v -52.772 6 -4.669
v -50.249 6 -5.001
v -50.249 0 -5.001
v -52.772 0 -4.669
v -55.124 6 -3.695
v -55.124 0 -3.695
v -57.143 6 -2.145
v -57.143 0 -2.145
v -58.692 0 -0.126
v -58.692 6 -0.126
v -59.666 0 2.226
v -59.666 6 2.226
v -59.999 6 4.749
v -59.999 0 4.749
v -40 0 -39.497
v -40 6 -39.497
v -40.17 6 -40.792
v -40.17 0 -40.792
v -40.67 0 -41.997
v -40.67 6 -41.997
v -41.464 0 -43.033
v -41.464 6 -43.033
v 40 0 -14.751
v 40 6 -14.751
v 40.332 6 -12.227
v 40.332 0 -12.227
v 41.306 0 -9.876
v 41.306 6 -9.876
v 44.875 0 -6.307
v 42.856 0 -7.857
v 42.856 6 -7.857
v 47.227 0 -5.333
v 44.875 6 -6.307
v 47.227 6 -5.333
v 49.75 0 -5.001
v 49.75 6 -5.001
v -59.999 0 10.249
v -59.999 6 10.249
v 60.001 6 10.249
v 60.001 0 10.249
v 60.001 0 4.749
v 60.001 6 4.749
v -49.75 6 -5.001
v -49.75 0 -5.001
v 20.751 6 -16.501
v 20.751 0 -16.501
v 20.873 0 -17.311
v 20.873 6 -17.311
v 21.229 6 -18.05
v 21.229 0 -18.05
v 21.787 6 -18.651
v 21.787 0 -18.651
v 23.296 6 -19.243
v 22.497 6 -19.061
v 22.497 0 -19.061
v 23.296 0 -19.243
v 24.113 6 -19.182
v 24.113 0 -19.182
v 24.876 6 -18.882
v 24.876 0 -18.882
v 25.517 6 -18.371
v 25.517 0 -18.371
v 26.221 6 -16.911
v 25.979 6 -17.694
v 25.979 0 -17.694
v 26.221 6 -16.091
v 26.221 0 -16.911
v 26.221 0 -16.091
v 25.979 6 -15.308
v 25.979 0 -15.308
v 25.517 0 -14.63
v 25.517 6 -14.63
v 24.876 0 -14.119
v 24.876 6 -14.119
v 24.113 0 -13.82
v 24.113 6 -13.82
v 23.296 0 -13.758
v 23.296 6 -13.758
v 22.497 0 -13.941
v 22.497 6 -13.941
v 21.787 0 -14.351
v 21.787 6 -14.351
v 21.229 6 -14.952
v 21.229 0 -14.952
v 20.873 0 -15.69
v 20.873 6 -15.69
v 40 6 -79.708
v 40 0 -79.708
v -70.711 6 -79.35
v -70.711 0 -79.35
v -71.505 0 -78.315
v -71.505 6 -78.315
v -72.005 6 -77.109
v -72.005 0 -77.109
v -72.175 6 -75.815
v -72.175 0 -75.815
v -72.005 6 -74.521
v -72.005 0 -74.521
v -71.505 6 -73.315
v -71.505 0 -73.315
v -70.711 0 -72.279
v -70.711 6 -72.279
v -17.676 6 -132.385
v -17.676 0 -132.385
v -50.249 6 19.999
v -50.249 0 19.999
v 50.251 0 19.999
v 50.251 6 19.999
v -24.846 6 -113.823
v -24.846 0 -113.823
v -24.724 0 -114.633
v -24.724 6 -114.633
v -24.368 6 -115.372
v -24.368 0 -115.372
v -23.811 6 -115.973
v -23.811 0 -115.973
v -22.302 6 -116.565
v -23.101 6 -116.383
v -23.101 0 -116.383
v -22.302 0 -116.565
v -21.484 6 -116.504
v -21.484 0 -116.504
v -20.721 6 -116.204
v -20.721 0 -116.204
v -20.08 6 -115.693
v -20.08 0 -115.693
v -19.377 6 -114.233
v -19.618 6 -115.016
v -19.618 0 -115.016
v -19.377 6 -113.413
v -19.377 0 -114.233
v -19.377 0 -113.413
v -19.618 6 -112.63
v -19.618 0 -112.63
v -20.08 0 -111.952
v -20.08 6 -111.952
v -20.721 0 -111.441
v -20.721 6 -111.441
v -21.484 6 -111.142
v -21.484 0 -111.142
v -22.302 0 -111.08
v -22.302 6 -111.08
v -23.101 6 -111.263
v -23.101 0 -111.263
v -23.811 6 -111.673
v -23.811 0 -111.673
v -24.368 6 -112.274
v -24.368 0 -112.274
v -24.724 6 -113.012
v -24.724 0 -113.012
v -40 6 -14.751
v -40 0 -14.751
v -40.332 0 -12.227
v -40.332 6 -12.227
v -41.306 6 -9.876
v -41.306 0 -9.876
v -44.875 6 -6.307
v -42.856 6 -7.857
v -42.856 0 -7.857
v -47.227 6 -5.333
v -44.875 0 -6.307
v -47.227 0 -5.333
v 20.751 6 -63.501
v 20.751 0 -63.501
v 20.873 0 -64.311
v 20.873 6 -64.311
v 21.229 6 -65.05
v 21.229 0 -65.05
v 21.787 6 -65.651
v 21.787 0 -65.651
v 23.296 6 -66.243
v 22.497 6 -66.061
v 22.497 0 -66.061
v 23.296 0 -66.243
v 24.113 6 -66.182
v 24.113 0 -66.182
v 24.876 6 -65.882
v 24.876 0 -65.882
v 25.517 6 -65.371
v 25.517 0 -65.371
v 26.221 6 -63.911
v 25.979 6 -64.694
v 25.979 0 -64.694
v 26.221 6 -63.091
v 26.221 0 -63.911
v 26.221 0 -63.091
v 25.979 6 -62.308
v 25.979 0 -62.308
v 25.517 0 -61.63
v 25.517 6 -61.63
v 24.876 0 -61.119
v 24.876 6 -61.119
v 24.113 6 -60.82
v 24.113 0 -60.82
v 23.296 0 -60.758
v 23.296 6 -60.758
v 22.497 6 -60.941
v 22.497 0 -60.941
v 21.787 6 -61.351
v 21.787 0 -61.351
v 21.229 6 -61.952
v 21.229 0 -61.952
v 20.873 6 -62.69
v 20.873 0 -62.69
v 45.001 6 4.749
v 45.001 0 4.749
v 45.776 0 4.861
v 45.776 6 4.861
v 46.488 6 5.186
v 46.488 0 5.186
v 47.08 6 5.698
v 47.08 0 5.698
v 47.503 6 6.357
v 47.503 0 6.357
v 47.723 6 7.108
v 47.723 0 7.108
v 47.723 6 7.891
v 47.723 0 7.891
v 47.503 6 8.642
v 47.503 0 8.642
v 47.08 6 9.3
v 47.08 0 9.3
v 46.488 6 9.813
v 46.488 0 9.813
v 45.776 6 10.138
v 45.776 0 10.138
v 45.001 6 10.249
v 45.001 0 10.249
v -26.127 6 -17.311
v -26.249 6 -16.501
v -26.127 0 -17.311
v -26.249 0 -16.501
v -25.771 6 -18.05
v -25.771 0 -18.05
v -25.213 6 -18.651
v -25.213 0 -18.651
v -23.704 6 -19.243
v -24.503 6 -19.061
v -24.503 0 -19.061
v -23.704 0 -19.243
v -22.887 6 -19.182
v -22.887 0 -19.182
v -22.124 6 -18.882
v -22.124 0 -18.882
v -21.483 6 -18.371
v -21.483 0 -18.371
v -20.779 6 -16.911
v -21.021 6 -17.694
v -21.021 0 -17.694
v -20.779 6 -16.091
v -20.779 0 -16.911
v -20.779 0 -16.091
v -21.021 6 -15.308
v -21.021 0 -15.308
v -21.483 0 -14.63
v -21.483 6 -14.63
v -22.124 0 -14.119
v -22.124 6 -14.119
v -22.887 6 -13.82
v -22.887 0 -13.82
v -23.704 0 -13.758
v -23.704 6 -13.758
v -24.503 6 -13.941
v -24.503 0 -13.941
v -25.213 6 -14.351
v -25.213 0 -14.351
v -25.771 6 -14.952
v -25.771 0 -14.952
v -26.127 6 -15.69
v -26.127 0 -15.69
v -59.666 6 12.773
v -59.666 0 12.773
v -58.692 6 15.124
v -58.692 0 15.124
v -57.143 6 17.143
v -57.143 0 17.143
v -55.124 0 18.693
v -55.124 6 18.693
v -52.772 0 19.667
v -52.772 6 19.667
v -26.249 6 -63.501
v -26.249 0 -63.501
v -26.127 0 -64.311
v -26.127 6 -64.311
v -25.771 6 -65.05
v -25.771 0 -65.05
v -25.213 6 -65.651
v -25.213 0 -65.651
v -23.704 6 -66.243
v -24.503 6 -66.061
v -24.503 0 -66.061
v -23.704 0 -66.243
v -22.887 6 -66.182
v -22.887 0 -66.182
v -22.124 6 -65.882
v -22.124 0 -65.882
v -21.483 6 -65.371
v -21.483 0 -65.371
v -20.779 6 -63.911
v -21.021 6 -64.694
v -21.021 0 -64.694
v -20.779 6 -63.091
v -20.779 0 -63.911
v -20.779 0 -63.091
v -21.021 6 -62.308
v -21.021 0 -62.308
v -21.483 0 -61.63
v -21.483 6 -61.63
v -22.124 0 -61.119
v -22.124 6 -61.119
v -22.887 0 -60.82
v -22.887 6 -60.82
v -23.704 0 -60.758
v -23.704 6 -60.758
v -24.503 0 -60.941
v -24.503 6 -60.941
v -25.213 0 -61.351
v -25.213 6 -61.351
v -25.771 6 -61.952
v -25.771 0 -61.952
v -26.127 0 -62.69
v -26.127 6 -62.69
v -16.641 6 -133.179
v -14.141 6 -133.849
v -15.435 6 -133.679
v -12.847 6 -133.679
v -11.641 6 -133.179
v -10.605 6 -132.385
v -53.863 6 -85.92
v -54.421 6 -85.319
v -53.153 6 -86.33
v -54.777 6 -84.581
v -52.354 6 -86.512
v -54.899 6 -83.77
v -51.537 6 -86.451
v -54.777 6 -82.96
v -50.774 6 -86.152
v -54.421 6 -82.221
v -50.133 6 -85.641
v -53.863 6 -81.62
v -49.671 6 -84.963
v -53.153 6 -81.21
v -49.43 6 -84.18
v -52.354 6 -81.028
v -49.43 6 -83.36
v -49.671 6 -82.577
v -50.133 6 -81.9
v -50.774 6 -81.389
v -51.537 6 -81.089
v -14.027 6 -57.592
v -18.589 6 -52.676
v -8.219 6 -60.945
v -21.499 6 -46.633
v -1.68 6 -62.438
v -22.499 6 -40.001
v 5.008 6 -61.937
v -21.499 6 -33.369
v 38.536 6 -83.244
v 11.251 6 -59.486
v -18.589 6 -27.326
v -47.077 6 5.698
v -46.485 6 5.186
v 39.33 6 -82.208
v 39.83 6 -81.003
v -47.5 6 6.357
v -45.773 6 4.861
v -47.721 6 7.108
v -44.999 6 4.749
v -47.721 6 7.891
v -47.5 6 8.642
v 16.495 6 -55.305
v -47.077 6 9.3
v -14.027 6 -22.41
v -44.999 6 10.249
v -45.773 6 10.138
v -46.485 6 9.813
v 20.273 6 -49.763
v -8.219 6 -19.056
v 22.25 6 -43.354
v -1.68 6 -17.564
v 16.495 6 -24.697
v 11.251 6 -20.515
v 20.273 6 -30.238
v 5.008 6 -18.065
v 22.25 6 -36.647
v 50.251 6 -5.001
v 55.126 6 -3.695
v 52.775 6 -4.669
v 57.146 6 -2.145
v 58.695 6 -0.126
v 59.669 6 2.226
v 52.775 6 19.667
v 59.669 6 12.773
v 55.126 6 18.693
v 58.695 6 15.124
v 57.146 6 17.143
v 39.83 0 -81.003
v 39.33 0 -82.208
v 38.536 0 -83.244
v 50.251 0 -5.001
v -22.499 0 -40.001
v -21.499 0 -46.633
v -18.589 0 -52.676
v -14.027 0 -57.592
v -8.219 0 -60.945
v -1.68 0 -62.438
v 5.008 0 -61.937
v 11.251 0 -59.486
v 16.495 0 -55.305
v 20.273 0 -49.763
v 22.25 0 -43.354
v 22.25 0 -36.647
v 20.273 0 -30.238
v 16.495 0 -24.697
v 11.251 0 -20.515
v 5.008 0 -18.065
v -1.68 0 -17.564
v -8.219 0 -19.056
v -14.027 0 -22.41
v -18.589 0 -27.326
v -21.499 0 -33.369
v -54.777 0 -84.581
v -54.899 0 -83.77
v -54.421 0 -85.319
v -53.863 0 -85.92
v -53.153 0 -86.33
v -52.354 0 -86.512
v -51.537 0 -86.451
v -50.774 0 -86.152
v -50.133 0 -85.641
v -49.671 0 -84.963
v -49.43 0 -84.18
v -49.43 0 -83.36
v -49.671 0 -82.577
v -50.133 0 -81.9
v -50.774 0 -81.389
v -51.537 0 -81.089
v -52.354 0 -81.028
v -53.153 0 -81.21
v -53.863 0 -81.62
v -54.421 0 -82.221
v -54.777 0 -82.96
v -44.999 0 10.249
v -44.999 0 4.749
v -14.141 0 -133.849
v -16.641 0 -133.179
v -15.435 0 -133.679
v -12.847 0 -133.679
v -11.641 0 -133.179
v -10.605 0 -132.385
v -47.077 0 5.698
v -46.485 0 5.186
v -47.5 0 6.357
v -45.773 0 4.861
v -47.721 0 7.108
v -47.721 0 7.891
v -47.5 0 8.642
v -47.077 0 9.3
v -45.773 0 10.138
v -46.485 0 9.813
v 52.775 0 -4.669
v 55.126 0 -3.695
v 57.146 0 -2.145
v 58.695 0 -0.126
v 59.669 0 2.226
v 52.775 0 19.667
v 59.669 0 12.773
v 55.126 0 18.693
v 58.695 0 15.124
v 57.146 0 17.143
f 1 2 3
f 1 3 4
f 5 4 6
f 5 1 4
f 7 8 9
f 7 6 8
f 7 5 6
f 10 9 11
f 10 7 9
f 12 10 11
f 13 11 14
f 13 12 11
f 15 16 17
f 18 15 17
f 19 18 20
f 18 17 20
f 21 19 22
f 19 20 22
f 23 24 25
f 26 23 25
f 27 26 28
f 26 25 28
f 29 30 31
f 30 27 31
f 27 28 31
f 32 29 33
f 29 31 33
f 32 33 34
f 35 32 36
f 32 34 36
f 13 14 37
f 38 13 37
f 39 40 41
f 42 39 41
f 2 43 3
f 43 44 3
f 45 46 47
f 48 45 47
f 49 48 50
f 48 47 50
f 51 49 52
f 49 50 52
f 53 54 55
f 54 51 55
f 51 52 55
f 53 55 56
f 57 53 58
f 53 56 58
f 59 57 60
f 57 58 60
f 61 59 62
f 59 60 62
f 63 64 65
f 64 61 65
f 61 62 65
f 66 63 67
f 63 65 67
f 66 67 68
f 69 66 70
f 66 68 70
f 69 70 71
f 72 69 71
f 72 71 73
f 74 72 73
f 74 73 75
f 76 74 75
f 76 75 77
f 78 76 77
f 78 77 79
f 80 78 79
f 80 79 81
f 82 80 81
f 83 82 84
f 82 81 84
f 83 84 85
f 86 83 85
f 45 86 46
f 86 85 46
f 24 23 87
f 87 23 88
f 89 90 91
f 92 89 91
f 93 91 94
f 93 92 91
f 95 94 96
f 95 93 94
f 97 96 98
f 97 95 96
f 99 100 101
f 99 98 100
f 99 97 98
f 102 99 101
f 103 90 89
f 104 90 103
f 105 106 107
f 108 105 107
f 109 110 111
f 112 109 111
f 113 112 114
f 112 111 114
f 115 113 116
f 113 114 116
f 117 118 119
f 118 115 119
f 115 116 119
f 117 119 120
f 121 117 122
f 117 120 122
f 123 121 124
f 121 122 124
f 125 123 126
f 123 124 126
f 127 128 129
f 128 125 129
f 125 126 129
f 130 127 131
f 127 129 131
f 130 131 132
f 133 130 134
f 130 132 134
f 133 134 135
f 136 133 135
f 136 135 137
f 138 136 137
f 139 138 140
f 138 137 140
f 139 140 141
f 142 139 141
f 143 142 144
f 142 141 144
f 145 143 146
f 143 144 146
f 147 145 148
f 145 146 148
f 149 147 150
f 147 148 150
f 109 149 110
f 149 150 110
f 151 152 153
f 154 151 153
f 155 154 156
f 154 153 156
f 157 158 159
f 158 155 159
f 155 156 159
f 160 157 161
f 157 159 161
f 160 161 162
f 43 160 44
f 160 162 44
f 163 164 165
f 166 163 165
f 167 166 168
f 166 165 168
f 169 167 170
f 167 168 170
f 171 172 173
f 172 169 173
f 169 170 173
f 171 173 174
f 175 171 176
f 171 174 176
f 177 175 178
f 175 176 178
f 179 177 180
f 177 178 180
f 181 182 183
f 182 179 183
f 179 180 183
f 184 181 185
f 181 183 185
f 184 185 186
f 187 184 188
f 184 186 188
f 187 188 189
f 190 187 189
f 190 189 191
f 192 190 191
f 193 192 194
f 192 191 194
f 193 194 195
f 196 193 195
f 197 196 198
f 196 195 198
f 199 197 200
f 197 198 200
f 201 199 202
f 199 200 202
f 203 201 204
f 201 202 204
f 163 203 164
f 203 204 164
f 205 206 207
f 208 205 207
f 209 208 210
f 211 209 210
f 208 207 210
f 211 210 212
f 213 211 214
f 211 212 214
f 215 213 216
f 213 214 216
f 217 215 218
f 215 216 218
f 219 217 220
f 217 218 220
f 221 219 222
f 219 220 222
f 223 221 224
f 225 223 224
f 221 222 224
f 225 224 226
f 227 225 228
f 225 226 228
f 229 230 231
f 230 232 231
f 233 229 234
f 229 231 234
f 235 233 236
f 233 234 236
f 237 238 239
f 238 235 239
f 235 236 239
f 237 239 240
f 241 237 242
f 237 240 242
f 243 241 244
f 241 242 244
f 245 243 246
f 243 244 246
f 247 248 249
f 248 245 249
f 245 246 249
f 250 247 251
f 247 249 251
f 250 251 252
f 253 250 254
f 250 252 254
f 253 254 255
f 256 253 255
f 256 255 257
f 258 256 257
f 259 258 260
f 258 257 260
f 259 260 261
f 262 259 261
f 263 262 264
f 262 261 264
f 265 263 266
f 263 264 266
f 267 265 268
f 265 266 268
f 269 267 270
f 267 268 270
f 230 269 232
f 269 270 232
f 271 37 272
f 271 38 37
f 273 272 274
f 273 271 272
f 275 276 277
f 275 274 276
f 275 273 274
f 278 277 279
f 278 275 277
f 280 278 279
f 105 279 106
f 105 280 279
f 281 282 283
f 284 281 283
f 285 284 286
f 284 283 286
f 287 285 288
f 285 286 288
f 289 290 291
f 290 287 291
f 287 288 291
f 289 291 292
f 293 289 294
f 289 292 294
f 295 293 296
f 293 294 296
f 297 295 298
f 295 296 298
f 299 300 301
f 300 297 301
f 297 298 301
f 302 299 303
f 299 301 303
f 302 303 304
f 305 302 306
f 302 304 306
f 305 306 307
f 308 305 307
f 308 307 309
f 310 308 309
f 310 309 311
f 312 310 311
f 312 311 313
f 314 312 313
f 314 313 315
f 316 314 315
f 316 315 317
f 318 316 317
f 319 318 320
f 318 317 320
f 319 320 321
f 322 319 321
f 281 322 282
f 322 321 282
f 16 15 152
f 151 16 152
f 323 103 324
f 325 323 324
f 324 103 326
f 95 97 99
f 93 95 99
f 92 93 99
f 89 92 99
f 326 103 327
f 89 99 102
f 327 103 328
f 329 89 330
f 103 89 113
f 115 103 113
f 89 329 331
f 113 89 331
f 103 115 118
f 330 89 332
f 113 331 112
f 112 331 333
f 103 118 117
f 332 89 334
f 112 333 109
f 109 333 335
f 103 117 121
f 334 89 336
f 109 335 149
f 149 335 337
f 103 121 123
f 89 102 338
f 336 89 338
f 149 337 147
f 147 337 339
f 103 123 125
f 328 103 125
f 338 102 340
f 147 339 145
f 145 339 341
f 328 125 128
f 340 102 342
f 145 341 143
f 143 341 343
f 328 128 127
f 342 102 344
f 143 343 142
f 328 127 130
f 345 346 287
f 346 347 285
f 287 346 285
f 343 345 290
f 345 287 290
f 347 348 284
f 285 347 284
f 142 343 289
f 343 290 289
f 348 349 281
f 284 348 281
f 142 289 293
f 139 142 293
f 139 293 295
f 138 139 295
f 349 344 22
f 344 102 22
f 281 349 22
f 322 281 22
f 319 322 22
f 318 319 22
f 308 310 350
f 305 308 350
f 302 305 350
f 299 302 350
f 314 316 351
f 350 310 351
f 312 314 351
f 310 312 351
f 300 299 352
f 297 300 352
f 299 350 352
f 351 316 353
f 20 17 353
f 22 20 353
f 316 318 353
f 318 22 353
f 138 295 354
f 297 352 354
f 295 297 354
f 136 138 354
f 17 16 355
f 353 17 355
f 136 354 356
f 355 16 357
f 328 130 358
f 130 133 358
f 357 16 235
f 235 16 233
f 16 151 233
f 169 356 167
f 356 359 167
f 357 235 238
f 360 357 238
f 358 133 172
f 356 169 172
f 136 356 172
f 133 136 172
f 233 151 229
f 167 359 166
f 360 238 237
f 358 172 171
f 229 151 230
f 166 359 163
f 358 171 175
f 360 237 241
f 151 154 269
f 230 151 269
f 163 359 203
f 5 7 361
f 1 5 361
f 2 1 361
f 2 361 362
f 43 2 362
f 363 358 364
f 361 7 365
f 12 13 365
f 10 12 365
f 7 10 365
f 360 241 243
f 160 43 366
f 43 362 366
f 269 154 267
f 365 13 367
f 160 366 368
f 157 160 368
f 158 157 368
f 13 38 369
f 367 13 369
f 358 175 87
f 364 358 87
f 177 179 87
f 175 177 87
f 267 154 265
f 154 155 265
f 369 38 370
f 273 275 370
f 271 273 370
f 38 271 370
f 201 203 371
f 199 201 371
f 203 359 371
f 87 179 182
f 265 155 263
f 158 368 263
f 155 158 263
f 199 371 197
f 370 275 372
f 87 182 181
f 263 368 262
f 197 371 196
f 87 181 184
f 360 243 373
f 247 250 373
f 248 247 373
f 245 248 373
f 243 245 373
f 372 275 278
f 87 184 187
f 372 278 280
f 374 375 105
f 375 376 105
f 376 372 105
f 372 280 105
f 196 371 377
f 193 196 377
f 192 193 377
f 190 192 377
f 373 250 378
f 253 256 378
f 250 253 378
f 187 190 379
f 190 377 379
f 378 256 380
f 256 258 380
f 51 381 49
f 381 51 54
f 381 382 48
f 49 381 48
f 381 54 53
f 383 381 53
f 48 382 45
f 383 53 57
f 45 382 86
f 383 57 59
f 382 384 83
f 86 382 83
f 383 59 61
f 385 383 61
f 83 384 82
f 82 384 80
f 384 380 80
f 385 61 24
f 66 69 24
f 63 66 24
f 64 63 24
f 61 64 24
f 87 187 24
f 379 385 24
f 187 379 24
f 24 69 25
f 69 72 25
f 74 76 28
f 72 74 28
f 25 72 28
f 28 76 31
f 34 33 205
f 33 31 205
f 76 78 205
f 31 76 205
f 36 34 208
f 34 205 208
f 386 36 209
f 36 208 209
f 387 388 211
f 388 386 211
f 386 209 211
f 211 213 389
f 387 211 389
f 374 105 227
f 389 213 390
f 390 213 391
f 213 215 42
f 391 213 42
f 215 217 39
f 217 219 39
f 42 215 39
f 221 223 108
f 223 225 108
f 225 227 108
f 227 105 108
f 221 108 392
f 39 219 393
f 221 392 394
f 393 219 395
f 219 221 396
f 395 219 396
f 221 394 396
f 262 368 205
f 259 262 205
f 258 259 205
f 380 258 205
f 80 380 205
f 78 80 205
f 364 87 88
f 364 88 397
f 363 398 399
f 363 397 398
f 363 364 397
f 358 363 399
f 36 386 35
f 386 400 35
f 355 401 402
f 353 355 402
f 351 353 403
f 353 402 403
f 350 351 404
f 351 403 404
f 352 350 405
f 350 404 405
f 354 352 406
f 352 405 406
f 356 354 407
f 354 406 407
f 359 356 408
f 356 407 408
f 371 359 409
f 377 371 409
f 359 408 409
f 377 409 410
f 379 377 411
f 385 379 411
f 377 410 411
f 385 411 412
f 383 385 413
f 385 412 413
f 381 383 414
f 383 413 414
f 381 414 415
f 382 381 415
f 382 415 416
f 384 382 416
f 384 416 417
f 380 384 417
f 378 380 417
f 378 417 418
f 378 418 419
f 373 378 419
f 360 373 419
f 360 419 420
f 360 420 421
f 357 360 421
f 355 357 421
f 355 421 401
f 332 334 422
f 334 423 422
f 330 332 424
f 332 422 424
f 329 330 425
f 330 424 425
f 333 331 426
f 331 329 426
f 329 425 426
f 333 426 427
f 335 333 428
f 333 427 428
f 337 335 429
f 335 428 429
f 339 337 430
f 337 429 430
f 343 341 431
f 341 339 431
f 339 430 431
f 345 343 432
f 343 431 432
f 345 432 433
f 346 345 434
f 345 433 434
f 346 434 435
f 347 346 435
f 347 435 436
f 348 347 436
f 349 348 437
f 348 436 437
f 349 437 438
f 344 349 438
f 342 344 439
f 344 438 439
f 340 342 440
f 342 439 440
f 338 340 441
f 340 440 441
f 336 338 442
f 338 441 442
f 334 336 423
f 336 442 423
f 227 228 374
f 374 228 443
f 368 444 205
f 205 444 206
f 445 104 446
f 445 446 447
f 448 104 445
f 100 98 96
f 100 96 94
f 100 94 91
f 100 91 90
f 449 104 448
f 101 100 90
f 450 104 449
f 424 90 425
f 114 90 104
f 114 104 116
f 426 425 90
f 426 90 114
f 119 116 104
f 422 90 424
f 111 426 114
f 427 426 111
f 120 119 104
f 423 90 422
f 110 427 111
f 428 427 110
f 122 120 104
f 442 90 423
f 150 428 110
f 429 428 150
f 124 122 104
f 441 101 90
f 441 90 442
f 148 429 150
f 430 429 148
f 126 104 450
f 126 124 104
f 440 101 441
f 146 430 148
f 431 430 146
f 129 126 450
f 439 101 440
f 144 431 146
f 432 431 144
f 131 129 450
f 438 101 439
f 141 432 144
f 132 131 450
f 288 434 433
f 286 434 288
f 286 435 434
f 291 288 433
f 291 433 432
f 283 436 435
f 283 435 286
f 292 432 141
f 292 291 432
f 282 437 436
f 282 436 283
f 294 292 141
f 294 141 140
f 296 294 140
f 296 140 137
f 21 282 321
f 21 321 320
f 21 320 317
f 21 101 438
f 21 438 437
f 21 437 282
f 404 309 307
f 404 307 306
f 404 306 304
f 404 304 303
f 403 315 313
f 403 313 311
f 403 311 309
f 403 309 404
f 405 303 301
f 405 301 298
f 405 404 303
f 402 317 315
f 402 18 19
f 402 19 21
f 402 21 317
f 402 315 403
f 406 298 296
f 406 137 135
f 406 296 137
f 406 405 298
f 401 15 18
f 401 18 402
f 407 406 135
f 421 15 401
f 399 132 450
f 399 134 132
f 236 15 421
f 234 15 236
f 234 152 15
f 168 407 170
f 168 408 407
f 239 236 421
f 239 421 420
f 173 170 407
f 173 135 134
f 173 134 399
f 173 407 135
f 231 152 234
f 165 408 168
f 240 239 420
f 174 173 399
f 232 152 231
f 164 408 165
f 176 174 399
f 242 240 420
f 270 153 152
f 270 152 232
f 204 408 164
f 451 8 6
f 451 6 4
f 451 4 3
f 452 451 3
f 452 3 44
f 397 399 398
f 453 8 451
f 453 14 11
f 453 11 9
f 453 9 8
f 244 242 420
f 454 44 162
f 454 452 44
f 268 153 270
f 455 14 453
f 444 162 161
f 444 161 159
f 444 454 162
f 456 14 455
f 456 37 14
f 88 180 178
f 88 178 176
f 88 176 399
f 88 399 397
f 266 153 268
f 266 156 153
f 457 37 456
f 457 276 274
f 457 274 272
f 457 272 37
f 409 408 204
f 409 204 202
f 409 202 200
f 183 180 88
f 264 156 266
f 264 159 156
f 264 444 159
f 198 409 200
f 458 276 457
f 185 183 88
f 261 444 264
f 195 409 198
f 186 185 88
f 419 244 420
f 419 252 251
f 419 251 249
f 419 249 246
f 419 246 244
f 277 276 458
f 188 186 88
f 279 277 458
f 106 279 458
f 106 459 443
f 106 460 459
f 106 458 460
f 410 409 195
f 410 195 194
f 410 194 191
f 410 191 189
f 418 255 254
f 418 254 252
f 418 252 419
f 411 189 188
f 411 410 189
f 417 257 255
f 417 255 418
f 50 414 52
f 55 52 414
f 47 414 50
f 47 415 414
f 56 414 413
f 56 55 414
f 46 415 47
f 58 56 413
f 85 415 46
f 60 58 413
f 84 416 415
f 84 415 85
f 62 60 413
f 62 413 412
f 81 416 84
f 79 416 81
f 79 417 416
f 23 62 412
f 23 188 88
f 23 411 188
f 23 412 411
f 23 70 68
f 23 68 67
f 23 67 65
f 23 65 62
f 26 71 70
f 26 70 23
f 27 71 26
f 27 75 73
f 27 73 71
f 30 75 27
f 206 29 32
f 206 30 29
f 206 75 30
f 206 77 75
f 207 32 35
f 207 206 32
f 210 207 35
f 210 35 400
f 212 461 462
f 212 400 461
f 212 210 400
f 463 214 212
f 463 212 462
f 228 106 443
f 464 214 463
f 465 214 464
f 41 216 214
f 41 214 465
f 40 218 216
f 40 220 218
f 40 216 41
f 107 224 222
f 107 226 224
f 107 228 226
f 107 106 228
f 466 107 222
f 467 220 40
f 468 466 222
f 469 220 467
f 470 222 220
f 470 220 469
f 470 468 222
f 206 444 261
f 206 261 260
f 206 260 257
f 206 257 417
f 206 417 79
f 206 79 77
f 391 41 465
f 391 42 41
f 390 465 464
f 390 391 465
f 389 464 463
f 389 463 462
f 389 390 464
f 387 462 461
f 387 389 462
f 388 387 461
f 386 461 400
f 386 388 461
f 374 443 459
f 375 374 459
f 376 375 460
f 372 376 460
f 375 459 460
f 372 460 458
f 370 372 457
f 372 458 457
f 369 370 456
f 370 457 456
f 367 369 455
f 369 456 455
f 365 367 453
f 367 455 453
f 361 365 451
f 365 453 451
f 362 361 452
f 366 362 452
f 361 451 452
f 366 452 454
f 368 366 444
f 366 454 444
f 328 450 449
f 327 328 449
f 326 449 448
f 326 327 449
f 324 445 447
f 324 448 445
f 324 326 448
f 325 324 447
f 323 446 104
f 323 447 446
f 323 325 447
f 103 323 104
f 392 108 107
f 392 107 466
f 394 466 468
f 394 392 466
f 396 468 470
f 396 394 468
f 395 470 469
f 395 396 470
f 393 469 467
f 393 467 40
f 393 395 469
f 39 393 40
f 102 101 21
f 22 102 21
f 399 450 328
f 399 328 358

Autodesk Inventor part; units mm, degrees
ref_plane "YZ Plane" through (0, 0, 0) normal (1, 0, 0) x (0, 1, 0)
sketch "Sketch1" plane through (0, 0, 0) normal (0, 1, 0) x (-1, 0, 0)
  line L0 (40, 90) -> (-40, 90)
  line L1 (-40, 90) -> (-40, -81.7795)
  line L2 (40, -41.5685) -> (40, 90)
  line L3 (40, 90) -> (-40, -90) construction
  line L4 (-40, 90) -> (40, -90) construction
  circle A0 centre (-0.0013, 54.9992) radius 5.1
  line L5 (23.4987, -16.5008) -> (-23.5013, -16.5008) construction
  line L6 (-23.5013, -16.5008) -> (-23.5013, -63.5008) construction
  line L7 (-23.5013, -63.5008) -> (23.4987, -63.5008) construction
  line L8 (23.4987, -63.5008) -> (23.4987, -16.5008) construction
  line L9 (23.4987, -16.5008) -> (-23.5013, -63.5008) construction
  line L10 (-23.5013, -16.5008) -> (23.4987, -63.5008) construction
  circle A1 centre (23.4987, -16.5008) radius 2.75
  circle A2 centre (23.4987, -63.5008) radius 2.75
  circle A3 centre (-23.5013, -16.5008) radius 2.75
  circle A4 centre (-23.5013, -63.5008) radius 2.75
  line L11 (-0.0013, -90.0008) -> (-0.0013, -80) construction
  line L12 (19.9987, -11.0008) -> (-20.0013, -11.0008) construction
  line L13 (-20.0013, -11.0008) -> (-20.0013, -69.0008) construction
  line L14 (-20.0013, -69.0008) -> (19.9987, -69.0008) construction
  line L15 (19.9987, -69.0008) -> (19.9987, -11.0008) construction
  line L16 (19.9987, -11.0008) -> (-20.0013, -69.0008) construction
  line L17 (-20.0013, -11.0008) -> (19.9987, -69.0008) construction
  line L18 (-29.0013, -60.0008) -> (28.9987, -60.0008) construction
  line L19 (28.9987, -60.0008) -> (28.9987, -20.0008) construction
  line L20 (28.9987, -20.0008) -> (-29.0013, -20.0008) construction
  line L21 (-29.0013, -20.0008) -> (-29.0013, -60.0008)
  line L22 (-29.0013, -60.0008) -> (28.9987, -20.0008) construction
  line L23 (28.9987, -60.0008) -> (-29.0013, -20.0008) construction
  line L24 (-0.0013, 54.9992) -> (102.5291, -47.5313) construction
  line L25 (-0.0013, 54.9992) -> (144.9987, 54.9992) construction
  line L26 (28.2843, 83.2843) -> (-28.2843, 26.7157) construction
  line L27 (-28.2843, 26.7157) -> (74.2462, -75.8148) construction
  line L28 (74.2462, -75.8148) -> (130.8148, -19.2462) construction
  line L29 (130.8148, -19.2462) -> (28.2843, 83.2843) construction
  line L30 (28.2843, 83.2843) -> (74.2462, -75.8148) construction
  line L31 (-28.2843, 26.7157) -> (130.8148, -19.2462) construction
  line L32 (74.2462, -75.8148) -> (14.1407, -135.9202)
  line L33 (14.1407, -135.9202) -> (-0.0014, -121.7781)
  line L34 (-0.0014, -121.7781) -> (-31.7795, -90)
  line L35 (74.2462, -75.8148) -> (40, -41.5685)
  line L36 (-31.7795, -90) -> (-40, -81.7795)
  line L37 (44.1935, -105.8675) -> (37.1224, -98.7964)
  line L38 (37.1224, -98.7964) -> (52.1488, -83.7701) construction
  line L39 (37.1224, -98.7964) -> (22.096, -113.8228) construction
  circle A5 centre (52.1488, -83.7701) radius 2.75
  circle A6 centre (22.096, -113.8228) radius 2.75
  line L40 (-0.0013, 54.9992) -> (-0.0013, -40.0008)
  circle A7 centre (-0.0013, -40.0008) radius 22.5
  point P0 (0, 0)
  point P1 (51.2639, 3.7339)
  dimension "d0" = 80
  dimension "d1" = 180
  dimension "d3" = 10.2
  dimension "d5" = 47
  dimension "d6" = 47
  dimension "d7" = 5.5
  dimension "d8" = 5.5
  dimension "d9" = 5.5
  dimension "d10" = 5.5
  dimension "d12" = 40
  dimension "d13" = 58
  dimension "d14" = 58
  dimension "d15" = 40
  dimension "d27" = 45
  dimension "d28" = 145
  dimension "d29" = 80
  dimension "d30" = 145
  dimension "d31" = 85.002
  dimension "d32" = 20
  dimension "d33" = 10
  dimension "d35" = 21.2505
  dimension "d36" = 21.2505
  dimension "d37" = 5.5
  dimension "d38" = 5.5
  dimension "d53" = 95
  dimension "d54" = 45
extrude "Plate3" add sketch "Sketch1" along normal blind 6
fillet "Fillet6" radius 5 4 edges at (-40, 3, -41.5685) (-74.2462, 3, -75.8148) (-14.1407, 3, -135.9202) (40, 3, -81.7795)
fillet "Fillet7" radius 40 2 edges at (40, 3, 90) (-40, 3, 90)
sketch "Sketch2" plane through (0, 0, 0) normal (0, -1, 0) x (1, 0, 0)
  circle A0 centre (0.0013, 54.9992) radius 5.1 projected
  line L0 (0.0013, 54.9992) -> (0.0013, -40.0008) construction
  line L1 (0.0013, 7.4992) -> (55.0013, 7.4992) construction
  line L2 (0.0013, 7.4992) -> (-54.9987, 7.4992) construction
  line L3 (-29.9987, 7.4992) -> (30.0013, 7.4992) construction
  line L4 (-29.9987, 4.7492) -> (30.0013, 4.7492)
  line L5 (30.0013, 10.2492) -> (-29.9987, 10.2492)
  arc A1 (-29.9987, 10.2492) -> (-29.9987, 4.7492) centre (-29.9987, 7.4992) ccw
  arc A2 (30.0013, 4.7492) -> (30.0013, 10.2492) centre (30.0013, 7.4992) ccw
  point P0 (0, 0)
  dimension "d43" = 95
  dimension "d44" = 55
  dimension "d45" = 55
  dimension "d46" = 30
  dimension "d47" = 5.5
extrude "Extrusion1" cut sketch "Sketch2" against normal blind 10 contours A1 L5 A2 L4
ref_plane "Work Plane2" through (30.0013, 0, 7.4992) normal (0, 0, -1) x (-1, 0, 0)
sketch "Sketch3" plane through (0, 0, 0) normal (0, -1, 0) x (1, 0, 0)
  line L0 (-29.9987, 4.7492) -> (30.0013, 4.7492) construction
  line L1 (0.0013, 4.7492) -> (0.0013, 10.2492) construction
  line L2 (30.0013, 10.2492) -> (-29.9987, 10.2492) construction
  point P0 (0, 0)
sketch "Sketch4" plane through (0, 0, 0) normal (0, -1, 0) x (1, 0, 0)
  line L0 (-29.9987, 4.7492) -> (30.0013, 4.7492)
  line L1 (0.0013, 4.7492) -> (0.0013, 10.2492)
  line L2 (30.0013, 10.2492) -> (-29.9987, 10.2492)
  line L3 (-59.9987, 19.9992) -> (60.0013, 19.9992)
  line L4 (60.0013, 19.9992) -> (60.0013, -5.0008)
  line L5 (60.0013, -5.0008) -> (-59.9987, -5.0008)
  line L6 (-59.9987, -5.0008) -> (-59.9987, 19.9992)
  line L7 (-59.9987, 19.9992) -> (60.0013, -5.0008) construction
  line L8 (60.0013, 19.9992) -> (-59.9987, -5.0008) construction
  line L9 (-29.9987, 7.4992) -> (30.0013, 7.4992) construction
  line L10 (-29.9987, 4.7492) -> (30.0013, 4.7492)
  line L11 (30.0013, 10.2492) -> (-29.9987, 10.2492)
  arc A0 (-29.9987, 10.2492) -> (-29.9987, 4.7492) centre (-29.9987, 7.4992) ccw
  arc A1 (30.0013, 4.7492) -> (30.0013, 10.2492) centre (30.0013, 7.4992) ccw
  point P0 (0, 0)
  point P1 (0.0013, 7.4992)
  dimension "d56" = 120
  dimension "d57" = 25
sheet face with bend "Face4" sketch "Sketch4" thickness 6 toward (0, 1, 0) bend radius 6
bend "Bend1"
fillet "Fillet11" radius 9.75 4 edges at (60.0013, 3, -5.0008) (60.0013, 3, 19.9992) (-59.9987, 3, -5.0008) (-59.9987, 3, 19.9992)
sketch "Sketch5" plane through (0, 0, 0) normal (0, -1, 0) x (1, 0, 0)
  line L0 (-29.9987, 4.7492) -> (30.0013, 4.7492) projected
  line L1 (0.0013, 4.7492) -> (0.0013, 10.2492)
  line L2 (30.0013, 10.2492) -> (-29.9987, 10.2492) projected
  line L3 (-44.9987, 7.4992) -> (45.0013, 7.4992) construction
  line L4 (-44.9987, 4.7492) -> (45.0013, 4.7492)
  line L5 (45.0013, 10.2492) -> (-44.9987, 10.2492)
  arc A0 (-44.9987, 10.2492) -> (-44.9987, 4.7492) centre (-44.9987, 7.4992) ccw
  arc A1 (45.0013, 4.7492) -> (45.0013, 10.2492) centre (45.0013, 7.4992) ccw
  point P0 (0, 0)
  point P1 (0.0013, 7.4992)
  dimension "d64" = 45
  dimension "d65" = 5.5
extrude "Extrusion2" cut sketch "Sketch5" against normal blind 10
fillet "Fillet12" radius 9.75 4 edges at (40, 3, -5.0008) (-40, 3, -5.0008) (-40, 3, 19.9992) (40, 3, 19.9992)
sketch "Sketch6" plane through (0, 0, 0) normal (0, -1, 0) x (1, 0, 0)
  arc A0 (40, 29.7492) -> (49.75, 19.9992) centre (49.75, 29.7492) ccw projected
  arc A1 (-49.75, 19.9992) -> (-40, 29.7492) centre (-49.75, 29.7492) ccw projected
  line L0 (49.75, 19.9992) -> (-49.75, 19.9992)
  arc A2 (60.0013, 10.2492) -> (50.2513, 19.9992) centre (50.2513, 10.2492) ccw projected
  line L1 (50.2513, 19.9992) -> (-50.2487, 19.9992)
  line L2 (-50.2487, 19.9992) -> (-50.2487, 91.8023)
  line L3 (-50.2487, 91.8023) -> (50.2513, 91.8023)
  line L4 (50.2513, 91.8023) -> (50.2513, 19.9992)
  point P0 (0, 0)
extrude "Extrusion3" cut sketch "Sketch6" against normal through all
ref_plane "Work Plane3" through (-44.9987, 0, 7.4992) normal (0, 0, 1) x (1, 0, 0)
equation "\"d39\" = Thickness"
equation "\"BendRadius\" = Thickness"
equation "\"BendReliefWidth\" = Thickness"
equation "\"BendReliefDepth\" = 0.5 * Thickness"
equation "\"CornerReliefSize\" = 4 * Thickness"
equation "\"MinimumRemnant\" = 2 * Thickness"
equation "\"TransitionRadius\" = BendRadius"
equation "\"JacobiRadiusSize\" = BendRadius"
equation "\"GapSize\" = Thickness"
equation "\"Thickness\" = 6"
properties part number "NEMA23MountPlatev2" material "Aluminum 6061"
